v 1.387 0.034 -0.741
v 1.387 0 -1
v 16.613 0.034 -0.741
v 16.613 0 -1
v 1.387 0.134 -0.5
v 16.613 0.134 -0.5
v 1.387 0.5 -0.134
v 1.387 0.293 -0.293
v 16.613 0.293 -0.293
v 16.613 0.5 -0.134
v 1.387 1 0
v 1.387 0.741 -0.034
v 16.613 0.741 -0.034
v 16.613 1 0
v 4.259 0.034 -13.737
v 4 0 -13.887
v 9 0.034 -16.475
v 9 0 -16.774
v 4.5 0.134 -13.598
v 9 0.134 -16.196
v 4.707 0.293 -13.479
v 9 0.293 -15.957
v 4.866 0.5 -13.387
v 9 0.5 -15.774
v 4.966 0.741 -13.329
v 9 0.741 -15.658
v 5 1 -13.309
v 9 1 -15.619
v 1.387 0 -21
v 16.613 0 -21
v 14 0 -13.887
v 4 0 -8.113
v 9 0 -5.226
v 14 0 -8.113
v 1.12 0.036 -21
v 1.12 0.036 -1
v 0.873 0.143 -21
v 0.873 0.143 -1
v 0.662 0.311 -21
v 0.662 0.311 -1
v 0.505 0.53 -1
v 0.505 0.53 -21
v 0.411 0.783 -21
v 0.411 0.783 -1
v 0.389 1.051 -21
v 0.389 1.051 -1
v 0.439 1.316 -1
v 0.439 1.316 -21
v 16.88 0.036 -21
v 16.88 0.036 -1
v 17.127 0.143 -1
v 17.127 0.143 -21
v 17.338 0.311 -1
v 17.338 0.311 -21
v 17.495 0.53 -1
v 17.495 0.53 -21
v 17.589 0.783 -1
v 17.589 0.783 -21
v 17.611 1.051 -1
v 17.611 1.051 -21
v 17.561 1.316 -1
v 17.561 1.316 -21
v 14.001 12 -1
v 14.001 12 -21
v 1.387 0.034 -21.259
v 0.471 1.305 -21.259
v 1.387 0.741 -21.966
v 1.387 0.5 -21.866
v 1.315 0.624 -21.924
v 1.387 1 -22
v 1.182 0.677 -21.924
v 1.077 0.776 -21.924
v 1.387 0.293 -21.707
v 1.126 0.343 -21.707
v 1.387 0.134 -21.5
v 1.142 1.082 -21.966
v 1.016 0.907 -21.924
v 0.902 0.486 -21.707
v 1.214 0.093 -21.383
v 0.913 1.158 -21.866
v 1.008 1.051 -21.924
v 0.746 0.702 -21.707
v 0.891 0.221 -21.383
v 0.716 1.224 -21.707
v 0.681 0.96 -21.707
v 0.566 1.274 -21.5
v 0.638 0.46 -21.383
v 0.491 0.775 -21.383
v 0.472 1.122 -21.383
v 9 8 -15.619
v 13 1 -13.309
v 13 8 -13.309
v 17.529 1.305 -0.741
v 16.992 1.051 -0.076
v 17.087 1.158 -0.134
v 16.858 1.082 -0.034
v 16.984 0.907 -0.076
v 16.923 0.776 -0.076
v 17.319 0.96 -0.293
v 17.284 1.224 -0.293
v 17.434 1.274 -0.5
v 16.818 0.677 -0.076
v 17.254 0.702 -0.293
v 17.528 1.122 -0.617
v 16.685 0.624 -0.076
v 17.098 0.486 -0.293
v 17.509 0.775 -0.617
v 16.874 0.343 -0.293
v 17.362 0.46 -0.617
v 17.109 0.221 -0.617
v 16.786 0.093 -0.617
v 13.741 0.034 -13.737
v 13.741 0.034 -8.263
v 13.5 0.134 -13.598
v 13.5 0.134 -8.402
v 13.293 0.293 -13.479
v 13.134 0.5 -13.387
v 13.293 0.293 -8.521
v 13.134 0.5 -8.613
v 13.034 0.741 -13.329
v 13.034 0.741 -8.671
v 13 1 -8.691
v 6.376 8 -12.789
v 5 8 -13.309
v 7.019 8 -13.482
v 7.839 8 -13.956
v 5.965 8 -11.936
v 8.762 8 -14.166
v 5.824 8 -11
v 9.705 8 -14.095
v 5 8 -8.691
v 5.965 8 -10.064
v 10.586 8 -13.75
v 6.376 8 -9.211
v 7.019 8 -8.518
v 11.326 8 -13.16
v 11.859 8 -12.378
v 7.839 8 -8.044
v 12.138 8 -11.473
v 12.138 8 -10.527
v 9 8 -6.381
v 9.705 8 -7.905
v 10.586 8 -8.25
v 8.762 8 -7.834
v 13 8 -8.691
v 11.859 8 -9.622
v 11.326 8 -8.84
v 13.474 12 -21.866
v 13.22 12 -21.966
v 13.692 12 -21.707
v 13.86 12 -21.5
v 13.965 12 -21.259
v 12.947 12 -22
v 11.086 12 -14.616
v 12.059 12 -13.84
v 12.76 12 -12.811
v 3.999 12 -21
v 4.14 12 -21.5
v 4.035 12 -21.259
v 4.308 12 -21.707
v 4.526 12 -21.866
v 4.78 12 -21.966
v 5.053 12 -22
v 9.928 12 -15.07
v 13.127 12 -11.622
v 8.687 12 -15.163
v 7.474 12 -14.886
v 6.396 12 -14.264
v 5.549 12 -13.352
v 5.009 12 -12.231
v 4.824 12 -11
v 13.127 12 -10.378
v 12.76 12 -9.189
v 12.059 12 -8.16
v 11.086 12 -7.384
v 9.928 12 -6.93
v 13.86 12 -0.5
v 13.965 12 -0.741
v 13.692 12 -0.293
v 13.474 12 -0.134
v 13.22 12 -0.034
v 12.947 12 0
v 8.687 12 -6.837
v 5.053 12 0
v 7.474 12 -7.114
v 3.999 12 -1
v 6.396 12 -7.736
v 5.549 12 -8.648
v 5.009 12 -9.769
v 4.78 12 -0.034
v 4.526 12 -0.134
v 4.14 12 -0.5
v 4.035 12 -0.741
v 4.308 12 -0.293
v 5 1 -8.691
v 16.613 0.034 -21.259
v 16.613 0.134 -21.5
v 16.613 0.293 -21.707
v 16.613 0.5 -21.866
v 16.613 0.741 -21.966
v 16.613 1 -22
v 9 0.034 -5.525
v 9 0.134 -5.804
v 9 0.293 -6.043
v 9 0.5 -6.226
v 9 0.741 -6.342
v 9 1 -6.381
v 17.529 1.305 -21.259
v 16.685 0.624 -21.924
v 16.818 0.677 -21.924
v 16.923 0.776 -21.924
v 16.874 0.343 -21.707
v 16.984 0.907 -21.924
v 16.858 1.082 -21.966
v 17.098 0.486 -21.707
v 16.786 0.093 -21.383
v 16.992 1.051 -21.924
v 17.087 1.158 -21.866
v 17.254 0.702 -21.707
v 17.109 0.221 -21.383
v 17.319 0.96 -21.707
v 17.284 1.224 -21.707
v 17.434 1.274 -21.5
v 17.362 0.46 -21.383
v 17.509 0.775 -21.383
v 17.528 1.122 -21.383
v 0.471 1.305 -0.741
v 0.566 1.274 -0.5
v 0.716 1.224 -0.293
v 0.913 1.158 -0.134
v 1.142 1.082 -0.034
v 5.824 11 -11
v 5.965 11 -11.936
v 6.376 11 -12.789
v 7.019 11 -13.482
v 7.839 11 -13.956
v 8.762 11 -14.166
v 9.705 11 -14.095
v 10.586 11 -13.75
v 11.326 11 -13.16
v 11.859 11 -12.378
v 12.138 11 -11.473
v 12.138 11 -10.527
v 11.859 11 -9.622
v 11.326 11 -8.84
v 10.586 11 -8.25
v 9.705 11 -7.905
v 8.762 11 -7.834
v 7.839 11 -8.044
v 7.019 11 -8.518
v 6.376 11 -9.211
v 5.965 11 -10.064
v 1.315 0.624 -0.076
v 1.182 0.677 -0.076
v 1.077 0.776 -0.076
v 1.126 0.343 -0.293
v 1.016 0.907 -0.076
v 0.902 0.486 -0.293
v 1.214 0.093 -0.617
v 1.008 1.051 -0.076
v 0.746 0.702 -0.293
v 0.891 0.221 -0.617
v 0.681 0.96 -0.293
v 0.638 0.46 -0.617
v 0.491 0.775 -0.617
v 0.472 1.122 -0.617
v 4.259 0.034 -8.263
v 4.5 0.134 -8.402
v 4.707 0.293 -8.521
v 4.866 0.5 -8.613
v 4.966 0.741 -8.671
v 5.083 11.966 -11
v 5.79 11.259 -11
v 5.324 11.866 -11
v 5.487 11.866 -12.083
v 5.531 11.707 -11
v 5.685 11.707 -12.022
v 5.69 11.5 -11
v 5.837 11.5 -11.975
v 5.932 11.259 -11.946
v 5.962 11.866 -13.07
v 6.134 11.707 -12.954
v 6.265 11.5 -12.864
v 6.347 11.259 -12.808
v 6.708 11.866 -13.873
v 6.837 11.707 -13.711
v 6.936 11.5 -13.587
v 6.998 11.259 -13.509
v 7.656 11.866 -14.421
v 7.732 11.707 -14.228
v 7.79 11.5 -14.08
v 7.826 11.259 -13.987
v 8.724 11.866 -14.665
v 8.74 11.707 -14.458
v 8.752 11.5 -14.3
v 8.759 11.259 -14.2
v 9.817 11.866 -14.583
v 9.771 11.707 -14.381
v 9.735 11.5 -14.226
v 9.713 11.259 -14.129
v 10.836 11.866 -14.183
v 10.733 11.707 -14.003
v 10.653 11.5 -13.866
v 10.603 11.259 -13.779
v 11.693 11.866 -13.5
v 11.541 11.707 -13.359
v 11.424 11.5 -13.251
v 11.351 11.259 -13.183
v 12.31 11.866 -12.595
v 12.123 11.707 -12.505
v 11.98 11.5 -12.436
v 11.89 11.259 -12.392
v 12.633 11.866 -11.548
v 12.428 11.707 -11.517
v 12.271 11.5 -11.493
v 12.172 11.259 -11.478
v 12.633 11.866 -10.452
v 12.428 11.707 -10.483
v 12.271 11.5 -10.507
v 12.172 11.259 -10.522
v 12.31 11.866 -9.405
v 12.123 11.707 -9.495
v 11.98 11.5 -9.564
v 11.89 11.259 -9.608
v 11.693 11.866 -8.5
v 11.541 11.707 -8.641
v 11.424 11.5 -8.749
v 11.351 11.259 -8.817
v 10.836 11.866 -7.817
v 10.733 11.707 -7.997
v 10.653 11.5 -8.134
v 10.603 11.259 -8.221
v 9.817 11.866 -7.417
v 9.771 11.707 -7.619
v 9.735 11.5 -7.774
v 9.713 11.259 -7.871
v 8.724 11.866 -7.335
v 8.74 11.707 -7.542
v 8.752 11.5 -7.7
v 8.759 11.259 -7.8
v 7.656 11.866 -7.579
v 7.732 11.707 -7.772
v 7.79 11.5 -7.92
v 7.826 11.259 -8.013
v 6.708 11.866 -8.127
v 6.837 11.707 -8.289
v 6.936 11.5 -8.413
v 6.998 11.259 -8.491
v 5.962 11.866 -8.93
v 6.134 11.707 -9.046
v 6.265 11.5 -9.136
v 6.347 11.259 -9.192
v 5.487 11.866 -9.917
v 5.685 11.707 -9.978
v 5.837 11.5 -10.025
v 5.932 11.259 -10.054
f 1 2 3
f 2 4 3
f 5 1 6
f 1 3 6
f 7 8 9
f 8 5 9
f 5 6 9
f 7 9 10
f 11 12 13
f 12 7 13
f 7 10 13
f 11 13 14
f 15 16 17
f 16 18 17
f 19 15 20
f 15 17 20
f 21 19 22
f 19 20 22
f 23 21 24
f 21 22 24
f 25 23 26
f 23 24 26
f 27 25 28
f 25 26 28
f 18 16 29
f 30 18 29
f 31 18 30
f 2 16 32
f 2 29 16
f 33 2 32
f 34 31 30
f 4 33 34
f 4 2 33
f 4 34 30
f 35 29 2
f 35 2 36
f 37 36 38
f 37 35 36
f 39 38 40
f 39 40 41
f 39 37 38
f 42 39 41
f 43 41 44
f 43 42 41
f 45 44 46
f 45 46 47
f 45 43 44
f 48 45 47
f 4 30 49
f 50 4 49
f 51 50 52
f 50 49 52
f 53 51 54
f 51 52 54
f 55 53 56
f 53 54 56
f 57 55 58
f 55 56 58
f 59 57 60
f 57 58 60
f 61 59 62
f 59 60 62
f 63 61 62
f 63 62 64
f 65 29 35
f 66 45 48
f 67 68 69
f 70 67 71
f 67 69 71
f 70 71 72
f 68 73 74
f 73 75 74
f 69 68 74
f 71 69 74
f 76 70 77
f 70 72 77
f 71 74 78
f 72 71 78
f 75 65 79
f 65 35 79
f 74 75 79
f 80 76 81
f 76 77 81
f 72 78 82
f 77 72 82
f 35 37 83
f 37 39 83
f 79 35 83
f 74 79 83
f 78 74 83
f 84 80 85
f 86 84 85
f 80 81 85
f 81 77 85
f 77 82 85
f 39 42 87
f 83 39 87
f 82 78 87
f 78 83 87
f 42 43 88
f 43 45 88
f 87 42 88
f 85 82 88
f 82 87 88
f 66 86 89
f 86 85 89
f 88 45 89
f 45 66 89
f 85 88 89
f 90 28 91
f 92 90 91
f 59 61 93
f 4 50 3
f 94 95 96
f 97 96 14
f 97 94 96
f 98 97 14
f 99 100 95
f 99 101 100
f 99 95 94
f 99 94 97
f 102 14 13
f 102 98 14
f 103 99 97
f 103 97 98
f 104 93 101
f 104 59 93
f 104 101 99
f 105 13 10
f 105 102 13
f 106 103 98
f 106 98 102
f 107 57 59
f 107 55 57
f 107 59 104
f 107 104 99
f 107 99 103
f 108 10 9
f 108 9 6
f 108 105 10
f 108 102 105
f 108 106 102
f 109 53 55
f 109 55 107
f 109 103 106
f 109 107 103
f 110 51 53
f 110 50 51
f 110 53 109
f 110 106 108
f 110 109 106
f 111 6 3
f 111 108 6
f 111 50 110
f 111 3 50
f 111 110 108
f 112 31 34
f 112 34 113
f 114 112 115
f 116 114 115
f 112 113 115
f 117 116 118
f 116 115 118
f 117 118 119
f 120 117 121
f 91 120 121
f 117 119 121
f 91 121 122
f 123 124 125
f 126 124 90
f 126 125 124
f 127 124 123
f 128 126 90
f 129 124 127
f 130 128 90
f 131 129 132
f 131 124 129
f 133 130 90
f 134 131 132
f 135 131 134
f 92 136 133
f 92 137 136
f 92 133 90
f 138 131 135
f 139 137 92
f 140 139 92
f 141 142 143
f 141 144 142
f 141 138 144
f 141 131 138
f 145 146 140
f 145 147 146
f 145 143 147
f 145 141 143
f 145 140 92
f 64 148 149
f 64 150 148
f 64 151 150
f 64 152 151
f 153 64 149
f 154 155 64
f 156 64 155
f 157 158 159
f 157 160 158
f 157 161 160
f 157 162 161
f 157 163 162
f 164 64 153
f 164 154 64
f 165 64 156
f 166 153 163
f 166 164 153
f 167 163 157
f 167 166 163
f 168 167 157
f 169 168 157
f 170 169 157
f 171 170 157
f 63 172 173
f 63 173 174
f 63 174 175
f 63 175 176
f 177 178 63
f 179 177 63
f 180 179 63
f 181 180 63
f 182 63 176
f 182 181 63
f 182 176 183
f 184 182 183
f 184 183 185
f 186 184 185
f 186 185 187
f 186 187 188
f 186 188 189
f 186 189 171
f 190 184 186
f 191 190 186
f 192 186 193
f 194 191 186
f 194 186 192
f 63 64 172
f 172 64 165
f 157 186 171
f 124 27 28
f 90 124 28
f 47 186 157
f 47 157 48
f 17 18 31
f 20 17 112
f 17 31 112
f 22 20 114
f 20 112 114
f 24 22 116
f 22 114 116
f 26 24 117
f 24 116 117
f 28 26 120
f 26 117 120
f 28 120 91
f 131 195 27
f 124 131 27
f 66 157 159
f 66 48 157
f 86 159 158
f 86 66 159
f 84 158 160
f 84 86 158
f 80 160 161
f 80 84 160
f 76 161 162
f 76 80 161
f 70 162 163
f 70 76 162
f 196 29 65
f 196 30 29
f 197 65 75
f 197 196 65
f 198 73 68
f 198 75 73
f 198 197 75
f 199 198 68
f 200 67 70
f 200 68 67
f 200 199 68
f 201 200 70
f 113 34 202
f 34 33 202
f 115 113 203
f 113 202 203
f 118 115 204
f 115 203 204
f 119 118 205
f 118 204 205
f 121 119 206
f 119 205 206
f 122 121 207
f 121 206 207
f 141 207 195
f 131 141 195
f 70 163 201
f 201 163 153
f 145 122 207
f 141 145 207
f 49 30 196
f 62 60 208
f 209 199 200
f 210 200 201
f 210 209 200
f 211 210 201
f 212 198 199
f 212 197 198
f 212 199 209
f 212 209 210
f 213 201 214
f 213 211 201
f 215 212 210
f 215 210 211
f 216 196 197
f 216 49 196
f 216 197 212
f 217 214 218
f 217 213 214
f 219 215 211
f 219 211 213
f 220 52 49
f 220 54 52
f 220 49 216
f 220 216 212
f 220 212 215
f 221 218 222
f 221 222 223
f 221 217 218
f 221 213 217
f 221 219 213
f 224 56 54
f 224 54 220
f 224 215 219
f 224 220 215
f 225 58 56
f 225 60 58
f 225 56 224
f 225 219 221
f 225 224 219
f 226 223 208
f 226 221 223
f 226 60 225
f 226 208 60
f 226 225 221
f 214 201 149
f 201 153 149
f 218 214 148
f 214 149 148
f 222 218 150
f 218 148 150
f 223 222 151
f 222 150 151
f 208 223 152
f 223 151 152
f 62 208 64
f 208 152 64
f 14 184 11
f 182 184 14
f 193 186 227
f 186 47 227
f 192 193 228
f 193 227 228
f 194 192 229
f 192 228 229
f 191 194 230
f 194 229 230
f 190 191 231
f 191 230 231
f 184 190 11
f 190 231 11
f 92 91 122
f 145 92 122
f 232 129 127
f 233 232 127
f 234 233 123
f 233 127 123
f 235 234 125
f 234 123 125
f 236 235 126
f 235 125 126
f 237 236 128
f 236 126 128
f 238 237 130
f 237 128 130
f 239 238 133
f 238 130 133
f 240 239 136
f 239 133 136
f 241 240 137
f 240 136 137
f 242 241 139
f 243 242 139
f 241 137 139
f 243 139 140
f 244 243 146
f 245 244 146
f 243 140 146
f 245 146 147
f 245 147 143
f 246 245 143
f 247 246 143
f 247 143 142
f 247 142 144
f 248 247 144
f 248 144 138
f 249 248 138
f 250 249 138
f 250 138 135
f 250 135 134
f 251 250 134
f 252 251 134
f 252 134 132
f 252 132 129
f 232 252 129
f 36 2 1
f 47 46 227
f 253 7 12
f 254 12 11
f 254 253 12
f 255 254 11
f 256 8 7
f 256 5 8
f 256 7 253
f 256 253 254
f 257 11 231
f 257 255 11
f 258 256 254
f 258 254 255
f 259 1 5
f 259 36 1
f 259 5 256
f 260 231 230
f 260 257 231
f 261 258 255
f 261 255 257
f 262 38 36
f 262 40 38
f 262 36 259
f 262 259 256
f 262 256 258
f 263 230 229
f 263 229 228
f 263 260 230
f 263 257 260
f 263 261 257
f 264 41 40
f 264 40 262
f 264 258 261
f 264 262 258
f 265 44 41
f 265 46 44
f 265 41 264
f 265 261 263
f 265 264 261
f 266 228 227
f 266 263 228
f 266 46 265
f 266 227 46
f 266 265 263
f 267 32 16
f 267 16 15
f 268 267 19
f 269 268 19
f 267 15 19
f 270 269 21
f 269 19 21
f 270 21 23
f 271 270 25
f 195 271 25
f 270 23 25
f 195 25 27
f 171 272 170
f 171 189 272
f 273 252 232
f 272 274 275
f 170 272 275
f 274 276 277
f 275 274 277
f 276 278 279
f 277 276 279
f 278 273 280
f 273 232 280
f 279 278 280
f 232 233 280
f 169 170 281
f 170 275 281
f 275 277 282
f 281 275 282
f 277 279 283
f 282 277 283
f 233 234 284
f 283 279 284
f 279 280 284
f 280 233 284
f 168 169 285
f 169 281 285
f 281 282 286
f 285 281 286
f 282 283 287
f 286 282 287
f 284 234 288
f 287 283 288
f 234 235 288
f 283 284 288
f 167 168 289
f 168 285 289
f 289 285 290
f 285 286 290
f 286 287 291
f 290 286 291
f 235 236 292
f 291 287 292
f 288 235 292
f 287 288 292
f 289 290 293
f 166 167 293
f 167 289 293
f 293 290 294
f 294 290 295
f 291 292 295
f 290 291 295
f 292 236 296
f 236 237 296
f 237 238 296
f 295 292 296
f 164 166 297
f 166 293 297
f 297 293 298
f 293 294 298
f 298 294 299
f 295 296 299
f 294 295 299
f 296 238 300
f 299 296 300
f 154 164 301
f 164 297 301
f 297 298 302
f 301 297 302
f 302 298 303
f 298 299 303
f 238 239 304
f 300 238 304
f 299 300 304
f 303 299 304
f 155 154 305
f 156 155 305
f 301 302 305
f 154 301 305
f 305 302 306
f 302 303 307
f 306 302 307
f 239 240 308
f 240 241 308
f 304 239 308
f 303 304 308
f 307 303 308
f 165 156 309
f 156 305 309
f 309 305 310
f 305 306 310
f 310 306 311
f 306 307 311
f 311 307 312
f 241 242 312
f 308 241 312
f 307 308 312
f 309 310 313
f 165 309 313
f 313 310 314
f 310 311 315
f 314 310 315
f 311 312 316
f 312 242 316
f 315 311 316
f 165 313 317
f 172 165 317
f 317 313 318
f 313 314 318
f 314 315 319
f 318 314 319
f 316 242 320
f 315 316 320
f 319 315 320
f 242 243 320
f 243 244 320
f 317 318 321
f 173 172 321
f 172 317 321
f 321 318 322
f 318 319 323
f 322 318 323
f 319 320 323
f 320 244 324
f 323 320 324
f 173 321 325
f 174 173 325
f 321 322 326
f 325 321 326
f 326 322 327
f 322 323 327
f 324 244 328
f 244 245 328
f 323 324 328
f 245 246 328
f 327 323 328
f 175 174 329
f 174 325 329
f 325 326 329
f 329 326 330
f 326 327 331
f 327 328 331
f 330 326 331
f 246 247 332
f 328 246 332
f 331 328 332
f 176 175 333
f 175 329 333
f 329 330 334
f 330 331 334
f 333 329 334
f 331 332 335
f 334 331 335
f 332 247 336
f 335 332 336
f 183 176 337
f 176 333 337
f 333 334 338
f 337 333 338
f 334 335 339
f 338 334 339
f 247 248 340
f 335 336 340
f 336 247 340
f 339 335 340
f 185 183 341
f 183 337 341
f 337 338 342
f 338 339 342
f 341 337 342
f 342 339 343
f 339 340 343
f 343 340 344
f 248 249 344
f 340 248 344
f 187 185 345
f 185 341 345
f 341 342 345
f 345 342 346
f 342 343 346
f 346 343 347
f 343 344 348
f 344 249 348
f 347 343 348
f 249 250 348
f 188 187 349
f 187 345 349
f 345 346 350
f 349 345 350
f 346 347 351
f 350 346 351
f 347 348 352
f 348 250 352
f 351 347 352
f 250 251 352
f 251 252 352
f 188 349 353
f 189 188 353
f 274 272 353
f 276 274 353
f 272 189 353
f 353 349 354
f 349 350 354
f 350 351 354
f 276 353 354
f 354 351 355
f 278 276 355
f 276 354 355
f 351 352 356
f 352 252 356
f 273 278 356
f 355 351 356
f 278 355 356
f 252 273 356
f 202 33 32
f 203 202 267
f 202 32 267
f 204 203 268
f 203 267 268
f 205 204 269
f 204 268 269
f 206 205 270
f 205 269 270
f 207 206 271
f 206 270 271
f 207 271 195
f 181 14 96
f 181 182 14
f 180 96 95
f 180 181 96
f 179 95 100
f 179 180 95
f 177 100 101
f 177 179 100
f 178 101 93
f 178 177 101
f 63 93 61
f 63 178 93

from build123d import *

# Parameters (mm, degrees)
BOSS_EXTRUDE1_DEPTH         = 22
CUT_EXTRUDE1_DEPTH          = 8
F_1_4_0_25_DIAMETER_HOLE1_D = 6.35
FILLET2_R                   = 1


with BuildPart() as part:
    # Sketch2 → Boss-Extrude1 (new body)
    with BuildSketch(Plane.XY):
        Polygon((0, 0), (18, 0), (14.00115161, 12), (3.99884839, 12), align=None)
    extrude(amount=-BOSS_EXTRUDE1_DEPTH)

    # Sketch3 → Cut-Extrude1 (cut)
    with BuildSketch(Plane.XZ):
        Polygon((13, -13.309401077), (13, -8.690598923), (9, -6.381197846), (5, -8.690598923), (5, -13.309401077), (9, -15.618802154), align=None)
    extrude(amount=-CUT_EXTRUDE1_DEPTH, mode=Mode.SUBTRACT)

    # 1/4 (0.25) Diameter Hole1 (through all)
    with Locations(Plane(origin=(0, 12, 0), x_dir=(1, 0, 0), z_dir=(0, 1, 0))):
        with Locations((8.99884839, 11)):
            Hole(F_1_4_0_25_DIAMETER_HOLE1_D / 2)

    # Fillet2
    fillet2_edges = [part.edges().sort_by_distance(p)[0] for p in [
        (16.000575805, 6, -22),
        (11, 0, -14.464101615),
        (13, 0, -11),
        (11, 0, -7.535898385),
        (7, 0, -7.535898385),
        (5, 0, -11),
        (7, 0, -14.464101615),
        (12.17384839, 12, -11),
        (1.999424195, 6, -22),
        (16.000575805, 6, 0),
        (9, 0, 0),
        (1.999424195, 6, 0),
        (18, 0, -11),
        (0, 0, -11),
        (9, 0, -22),
    ]]
    fillet(fillet2_edges, radius=FILLET2_R)


solid = part.part
